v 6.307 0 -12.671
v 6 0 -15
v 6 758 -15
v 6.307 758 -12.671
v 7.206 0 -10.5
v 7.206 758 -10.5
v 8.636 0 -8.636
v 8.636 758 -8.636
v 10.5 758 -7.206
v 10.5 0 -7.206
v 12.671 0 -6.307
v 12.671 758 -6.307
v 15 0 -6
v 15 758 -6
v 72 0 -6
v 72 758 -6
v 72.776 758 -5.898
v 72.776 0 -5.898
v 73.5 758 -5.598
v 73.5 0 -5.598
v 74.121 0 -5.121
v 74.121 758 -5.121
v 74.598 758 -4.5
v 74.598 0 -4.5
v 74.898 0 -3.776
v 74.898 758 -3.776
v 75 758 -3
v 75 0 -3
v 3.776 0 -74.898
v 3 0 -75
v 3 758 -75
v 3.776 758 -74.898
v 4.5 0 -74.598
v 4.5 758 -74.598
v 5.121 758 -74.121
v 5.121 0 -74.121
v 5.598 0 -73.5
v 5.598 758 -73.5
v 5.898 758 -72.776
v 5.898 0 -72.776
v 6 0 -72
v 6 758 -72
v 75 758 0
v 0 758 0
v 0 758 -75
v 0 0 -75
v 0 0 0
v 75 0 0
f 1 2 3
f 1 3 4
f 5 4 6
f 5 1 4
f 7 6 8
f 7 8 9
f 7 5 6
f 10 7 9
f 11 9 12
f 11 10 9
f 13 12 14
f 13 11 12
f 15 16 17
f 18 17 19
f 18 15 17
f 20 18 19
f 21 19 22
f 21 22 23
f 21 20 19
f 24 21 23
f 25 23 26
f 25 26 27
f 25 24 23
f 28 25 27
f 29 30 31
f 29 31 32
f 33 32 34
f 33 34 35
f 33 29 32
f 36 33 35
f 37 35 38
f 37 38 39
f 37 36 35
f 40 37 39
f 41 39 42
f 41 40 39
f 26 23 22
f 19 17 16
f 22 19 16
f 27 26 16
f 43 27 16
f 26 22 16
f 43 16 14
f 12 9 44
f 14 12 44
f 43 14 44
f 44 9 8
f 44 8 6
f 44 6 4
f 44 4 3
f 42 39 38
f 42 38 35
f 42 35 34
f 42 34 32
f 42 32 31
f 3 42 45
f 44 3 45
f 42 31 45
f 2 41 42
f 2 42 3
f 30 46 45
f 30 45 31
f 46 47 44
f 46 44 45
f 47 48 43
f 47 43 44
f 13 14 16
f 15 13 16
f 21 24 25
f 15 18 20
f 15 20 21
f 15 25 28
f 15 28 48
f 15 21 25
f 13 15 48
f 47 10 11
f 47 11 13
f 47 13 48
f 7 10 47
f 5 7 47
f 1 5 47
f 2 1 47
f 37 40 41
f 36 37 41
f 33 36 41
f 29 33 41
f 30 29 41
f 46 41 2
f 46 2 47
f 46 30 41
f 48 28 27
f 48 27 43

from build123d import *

# Parameters (mm, degrees)
EXTRUDE_1_DEPTH = 758


with BuildPart() as part:
    # Эскиз1 → Бобышка-Вытянуть1 (new body)
    with BuildSketch(Plane(origin=(0, 0, 0), x_dir=(1, 0, 0), z_dir=(0, 1, 0))):
        with BuildLine():
            Line((0, 0), (0, 75))
            Line((0, 75), (3, 75))
            ThreePointArc((3, 75), (5.121320344, 74.121320344), (6, 72))
            Line((6, 72), (6, 15))
            ThreePointArc((6, 15), (8.636038969, 8.636038969), (15, 6))
            Line((15, 6), (72, 6))
            ThreePointArc((72, 6), (74.121320344, 5.121320344), (75, 3))
            Line((75, 3), (75, 0))
            Line((75, 0), (0, 0))
        make_face()
    extrude(amount=EXTRUDE_1_DEPTH)


solid = part.part
